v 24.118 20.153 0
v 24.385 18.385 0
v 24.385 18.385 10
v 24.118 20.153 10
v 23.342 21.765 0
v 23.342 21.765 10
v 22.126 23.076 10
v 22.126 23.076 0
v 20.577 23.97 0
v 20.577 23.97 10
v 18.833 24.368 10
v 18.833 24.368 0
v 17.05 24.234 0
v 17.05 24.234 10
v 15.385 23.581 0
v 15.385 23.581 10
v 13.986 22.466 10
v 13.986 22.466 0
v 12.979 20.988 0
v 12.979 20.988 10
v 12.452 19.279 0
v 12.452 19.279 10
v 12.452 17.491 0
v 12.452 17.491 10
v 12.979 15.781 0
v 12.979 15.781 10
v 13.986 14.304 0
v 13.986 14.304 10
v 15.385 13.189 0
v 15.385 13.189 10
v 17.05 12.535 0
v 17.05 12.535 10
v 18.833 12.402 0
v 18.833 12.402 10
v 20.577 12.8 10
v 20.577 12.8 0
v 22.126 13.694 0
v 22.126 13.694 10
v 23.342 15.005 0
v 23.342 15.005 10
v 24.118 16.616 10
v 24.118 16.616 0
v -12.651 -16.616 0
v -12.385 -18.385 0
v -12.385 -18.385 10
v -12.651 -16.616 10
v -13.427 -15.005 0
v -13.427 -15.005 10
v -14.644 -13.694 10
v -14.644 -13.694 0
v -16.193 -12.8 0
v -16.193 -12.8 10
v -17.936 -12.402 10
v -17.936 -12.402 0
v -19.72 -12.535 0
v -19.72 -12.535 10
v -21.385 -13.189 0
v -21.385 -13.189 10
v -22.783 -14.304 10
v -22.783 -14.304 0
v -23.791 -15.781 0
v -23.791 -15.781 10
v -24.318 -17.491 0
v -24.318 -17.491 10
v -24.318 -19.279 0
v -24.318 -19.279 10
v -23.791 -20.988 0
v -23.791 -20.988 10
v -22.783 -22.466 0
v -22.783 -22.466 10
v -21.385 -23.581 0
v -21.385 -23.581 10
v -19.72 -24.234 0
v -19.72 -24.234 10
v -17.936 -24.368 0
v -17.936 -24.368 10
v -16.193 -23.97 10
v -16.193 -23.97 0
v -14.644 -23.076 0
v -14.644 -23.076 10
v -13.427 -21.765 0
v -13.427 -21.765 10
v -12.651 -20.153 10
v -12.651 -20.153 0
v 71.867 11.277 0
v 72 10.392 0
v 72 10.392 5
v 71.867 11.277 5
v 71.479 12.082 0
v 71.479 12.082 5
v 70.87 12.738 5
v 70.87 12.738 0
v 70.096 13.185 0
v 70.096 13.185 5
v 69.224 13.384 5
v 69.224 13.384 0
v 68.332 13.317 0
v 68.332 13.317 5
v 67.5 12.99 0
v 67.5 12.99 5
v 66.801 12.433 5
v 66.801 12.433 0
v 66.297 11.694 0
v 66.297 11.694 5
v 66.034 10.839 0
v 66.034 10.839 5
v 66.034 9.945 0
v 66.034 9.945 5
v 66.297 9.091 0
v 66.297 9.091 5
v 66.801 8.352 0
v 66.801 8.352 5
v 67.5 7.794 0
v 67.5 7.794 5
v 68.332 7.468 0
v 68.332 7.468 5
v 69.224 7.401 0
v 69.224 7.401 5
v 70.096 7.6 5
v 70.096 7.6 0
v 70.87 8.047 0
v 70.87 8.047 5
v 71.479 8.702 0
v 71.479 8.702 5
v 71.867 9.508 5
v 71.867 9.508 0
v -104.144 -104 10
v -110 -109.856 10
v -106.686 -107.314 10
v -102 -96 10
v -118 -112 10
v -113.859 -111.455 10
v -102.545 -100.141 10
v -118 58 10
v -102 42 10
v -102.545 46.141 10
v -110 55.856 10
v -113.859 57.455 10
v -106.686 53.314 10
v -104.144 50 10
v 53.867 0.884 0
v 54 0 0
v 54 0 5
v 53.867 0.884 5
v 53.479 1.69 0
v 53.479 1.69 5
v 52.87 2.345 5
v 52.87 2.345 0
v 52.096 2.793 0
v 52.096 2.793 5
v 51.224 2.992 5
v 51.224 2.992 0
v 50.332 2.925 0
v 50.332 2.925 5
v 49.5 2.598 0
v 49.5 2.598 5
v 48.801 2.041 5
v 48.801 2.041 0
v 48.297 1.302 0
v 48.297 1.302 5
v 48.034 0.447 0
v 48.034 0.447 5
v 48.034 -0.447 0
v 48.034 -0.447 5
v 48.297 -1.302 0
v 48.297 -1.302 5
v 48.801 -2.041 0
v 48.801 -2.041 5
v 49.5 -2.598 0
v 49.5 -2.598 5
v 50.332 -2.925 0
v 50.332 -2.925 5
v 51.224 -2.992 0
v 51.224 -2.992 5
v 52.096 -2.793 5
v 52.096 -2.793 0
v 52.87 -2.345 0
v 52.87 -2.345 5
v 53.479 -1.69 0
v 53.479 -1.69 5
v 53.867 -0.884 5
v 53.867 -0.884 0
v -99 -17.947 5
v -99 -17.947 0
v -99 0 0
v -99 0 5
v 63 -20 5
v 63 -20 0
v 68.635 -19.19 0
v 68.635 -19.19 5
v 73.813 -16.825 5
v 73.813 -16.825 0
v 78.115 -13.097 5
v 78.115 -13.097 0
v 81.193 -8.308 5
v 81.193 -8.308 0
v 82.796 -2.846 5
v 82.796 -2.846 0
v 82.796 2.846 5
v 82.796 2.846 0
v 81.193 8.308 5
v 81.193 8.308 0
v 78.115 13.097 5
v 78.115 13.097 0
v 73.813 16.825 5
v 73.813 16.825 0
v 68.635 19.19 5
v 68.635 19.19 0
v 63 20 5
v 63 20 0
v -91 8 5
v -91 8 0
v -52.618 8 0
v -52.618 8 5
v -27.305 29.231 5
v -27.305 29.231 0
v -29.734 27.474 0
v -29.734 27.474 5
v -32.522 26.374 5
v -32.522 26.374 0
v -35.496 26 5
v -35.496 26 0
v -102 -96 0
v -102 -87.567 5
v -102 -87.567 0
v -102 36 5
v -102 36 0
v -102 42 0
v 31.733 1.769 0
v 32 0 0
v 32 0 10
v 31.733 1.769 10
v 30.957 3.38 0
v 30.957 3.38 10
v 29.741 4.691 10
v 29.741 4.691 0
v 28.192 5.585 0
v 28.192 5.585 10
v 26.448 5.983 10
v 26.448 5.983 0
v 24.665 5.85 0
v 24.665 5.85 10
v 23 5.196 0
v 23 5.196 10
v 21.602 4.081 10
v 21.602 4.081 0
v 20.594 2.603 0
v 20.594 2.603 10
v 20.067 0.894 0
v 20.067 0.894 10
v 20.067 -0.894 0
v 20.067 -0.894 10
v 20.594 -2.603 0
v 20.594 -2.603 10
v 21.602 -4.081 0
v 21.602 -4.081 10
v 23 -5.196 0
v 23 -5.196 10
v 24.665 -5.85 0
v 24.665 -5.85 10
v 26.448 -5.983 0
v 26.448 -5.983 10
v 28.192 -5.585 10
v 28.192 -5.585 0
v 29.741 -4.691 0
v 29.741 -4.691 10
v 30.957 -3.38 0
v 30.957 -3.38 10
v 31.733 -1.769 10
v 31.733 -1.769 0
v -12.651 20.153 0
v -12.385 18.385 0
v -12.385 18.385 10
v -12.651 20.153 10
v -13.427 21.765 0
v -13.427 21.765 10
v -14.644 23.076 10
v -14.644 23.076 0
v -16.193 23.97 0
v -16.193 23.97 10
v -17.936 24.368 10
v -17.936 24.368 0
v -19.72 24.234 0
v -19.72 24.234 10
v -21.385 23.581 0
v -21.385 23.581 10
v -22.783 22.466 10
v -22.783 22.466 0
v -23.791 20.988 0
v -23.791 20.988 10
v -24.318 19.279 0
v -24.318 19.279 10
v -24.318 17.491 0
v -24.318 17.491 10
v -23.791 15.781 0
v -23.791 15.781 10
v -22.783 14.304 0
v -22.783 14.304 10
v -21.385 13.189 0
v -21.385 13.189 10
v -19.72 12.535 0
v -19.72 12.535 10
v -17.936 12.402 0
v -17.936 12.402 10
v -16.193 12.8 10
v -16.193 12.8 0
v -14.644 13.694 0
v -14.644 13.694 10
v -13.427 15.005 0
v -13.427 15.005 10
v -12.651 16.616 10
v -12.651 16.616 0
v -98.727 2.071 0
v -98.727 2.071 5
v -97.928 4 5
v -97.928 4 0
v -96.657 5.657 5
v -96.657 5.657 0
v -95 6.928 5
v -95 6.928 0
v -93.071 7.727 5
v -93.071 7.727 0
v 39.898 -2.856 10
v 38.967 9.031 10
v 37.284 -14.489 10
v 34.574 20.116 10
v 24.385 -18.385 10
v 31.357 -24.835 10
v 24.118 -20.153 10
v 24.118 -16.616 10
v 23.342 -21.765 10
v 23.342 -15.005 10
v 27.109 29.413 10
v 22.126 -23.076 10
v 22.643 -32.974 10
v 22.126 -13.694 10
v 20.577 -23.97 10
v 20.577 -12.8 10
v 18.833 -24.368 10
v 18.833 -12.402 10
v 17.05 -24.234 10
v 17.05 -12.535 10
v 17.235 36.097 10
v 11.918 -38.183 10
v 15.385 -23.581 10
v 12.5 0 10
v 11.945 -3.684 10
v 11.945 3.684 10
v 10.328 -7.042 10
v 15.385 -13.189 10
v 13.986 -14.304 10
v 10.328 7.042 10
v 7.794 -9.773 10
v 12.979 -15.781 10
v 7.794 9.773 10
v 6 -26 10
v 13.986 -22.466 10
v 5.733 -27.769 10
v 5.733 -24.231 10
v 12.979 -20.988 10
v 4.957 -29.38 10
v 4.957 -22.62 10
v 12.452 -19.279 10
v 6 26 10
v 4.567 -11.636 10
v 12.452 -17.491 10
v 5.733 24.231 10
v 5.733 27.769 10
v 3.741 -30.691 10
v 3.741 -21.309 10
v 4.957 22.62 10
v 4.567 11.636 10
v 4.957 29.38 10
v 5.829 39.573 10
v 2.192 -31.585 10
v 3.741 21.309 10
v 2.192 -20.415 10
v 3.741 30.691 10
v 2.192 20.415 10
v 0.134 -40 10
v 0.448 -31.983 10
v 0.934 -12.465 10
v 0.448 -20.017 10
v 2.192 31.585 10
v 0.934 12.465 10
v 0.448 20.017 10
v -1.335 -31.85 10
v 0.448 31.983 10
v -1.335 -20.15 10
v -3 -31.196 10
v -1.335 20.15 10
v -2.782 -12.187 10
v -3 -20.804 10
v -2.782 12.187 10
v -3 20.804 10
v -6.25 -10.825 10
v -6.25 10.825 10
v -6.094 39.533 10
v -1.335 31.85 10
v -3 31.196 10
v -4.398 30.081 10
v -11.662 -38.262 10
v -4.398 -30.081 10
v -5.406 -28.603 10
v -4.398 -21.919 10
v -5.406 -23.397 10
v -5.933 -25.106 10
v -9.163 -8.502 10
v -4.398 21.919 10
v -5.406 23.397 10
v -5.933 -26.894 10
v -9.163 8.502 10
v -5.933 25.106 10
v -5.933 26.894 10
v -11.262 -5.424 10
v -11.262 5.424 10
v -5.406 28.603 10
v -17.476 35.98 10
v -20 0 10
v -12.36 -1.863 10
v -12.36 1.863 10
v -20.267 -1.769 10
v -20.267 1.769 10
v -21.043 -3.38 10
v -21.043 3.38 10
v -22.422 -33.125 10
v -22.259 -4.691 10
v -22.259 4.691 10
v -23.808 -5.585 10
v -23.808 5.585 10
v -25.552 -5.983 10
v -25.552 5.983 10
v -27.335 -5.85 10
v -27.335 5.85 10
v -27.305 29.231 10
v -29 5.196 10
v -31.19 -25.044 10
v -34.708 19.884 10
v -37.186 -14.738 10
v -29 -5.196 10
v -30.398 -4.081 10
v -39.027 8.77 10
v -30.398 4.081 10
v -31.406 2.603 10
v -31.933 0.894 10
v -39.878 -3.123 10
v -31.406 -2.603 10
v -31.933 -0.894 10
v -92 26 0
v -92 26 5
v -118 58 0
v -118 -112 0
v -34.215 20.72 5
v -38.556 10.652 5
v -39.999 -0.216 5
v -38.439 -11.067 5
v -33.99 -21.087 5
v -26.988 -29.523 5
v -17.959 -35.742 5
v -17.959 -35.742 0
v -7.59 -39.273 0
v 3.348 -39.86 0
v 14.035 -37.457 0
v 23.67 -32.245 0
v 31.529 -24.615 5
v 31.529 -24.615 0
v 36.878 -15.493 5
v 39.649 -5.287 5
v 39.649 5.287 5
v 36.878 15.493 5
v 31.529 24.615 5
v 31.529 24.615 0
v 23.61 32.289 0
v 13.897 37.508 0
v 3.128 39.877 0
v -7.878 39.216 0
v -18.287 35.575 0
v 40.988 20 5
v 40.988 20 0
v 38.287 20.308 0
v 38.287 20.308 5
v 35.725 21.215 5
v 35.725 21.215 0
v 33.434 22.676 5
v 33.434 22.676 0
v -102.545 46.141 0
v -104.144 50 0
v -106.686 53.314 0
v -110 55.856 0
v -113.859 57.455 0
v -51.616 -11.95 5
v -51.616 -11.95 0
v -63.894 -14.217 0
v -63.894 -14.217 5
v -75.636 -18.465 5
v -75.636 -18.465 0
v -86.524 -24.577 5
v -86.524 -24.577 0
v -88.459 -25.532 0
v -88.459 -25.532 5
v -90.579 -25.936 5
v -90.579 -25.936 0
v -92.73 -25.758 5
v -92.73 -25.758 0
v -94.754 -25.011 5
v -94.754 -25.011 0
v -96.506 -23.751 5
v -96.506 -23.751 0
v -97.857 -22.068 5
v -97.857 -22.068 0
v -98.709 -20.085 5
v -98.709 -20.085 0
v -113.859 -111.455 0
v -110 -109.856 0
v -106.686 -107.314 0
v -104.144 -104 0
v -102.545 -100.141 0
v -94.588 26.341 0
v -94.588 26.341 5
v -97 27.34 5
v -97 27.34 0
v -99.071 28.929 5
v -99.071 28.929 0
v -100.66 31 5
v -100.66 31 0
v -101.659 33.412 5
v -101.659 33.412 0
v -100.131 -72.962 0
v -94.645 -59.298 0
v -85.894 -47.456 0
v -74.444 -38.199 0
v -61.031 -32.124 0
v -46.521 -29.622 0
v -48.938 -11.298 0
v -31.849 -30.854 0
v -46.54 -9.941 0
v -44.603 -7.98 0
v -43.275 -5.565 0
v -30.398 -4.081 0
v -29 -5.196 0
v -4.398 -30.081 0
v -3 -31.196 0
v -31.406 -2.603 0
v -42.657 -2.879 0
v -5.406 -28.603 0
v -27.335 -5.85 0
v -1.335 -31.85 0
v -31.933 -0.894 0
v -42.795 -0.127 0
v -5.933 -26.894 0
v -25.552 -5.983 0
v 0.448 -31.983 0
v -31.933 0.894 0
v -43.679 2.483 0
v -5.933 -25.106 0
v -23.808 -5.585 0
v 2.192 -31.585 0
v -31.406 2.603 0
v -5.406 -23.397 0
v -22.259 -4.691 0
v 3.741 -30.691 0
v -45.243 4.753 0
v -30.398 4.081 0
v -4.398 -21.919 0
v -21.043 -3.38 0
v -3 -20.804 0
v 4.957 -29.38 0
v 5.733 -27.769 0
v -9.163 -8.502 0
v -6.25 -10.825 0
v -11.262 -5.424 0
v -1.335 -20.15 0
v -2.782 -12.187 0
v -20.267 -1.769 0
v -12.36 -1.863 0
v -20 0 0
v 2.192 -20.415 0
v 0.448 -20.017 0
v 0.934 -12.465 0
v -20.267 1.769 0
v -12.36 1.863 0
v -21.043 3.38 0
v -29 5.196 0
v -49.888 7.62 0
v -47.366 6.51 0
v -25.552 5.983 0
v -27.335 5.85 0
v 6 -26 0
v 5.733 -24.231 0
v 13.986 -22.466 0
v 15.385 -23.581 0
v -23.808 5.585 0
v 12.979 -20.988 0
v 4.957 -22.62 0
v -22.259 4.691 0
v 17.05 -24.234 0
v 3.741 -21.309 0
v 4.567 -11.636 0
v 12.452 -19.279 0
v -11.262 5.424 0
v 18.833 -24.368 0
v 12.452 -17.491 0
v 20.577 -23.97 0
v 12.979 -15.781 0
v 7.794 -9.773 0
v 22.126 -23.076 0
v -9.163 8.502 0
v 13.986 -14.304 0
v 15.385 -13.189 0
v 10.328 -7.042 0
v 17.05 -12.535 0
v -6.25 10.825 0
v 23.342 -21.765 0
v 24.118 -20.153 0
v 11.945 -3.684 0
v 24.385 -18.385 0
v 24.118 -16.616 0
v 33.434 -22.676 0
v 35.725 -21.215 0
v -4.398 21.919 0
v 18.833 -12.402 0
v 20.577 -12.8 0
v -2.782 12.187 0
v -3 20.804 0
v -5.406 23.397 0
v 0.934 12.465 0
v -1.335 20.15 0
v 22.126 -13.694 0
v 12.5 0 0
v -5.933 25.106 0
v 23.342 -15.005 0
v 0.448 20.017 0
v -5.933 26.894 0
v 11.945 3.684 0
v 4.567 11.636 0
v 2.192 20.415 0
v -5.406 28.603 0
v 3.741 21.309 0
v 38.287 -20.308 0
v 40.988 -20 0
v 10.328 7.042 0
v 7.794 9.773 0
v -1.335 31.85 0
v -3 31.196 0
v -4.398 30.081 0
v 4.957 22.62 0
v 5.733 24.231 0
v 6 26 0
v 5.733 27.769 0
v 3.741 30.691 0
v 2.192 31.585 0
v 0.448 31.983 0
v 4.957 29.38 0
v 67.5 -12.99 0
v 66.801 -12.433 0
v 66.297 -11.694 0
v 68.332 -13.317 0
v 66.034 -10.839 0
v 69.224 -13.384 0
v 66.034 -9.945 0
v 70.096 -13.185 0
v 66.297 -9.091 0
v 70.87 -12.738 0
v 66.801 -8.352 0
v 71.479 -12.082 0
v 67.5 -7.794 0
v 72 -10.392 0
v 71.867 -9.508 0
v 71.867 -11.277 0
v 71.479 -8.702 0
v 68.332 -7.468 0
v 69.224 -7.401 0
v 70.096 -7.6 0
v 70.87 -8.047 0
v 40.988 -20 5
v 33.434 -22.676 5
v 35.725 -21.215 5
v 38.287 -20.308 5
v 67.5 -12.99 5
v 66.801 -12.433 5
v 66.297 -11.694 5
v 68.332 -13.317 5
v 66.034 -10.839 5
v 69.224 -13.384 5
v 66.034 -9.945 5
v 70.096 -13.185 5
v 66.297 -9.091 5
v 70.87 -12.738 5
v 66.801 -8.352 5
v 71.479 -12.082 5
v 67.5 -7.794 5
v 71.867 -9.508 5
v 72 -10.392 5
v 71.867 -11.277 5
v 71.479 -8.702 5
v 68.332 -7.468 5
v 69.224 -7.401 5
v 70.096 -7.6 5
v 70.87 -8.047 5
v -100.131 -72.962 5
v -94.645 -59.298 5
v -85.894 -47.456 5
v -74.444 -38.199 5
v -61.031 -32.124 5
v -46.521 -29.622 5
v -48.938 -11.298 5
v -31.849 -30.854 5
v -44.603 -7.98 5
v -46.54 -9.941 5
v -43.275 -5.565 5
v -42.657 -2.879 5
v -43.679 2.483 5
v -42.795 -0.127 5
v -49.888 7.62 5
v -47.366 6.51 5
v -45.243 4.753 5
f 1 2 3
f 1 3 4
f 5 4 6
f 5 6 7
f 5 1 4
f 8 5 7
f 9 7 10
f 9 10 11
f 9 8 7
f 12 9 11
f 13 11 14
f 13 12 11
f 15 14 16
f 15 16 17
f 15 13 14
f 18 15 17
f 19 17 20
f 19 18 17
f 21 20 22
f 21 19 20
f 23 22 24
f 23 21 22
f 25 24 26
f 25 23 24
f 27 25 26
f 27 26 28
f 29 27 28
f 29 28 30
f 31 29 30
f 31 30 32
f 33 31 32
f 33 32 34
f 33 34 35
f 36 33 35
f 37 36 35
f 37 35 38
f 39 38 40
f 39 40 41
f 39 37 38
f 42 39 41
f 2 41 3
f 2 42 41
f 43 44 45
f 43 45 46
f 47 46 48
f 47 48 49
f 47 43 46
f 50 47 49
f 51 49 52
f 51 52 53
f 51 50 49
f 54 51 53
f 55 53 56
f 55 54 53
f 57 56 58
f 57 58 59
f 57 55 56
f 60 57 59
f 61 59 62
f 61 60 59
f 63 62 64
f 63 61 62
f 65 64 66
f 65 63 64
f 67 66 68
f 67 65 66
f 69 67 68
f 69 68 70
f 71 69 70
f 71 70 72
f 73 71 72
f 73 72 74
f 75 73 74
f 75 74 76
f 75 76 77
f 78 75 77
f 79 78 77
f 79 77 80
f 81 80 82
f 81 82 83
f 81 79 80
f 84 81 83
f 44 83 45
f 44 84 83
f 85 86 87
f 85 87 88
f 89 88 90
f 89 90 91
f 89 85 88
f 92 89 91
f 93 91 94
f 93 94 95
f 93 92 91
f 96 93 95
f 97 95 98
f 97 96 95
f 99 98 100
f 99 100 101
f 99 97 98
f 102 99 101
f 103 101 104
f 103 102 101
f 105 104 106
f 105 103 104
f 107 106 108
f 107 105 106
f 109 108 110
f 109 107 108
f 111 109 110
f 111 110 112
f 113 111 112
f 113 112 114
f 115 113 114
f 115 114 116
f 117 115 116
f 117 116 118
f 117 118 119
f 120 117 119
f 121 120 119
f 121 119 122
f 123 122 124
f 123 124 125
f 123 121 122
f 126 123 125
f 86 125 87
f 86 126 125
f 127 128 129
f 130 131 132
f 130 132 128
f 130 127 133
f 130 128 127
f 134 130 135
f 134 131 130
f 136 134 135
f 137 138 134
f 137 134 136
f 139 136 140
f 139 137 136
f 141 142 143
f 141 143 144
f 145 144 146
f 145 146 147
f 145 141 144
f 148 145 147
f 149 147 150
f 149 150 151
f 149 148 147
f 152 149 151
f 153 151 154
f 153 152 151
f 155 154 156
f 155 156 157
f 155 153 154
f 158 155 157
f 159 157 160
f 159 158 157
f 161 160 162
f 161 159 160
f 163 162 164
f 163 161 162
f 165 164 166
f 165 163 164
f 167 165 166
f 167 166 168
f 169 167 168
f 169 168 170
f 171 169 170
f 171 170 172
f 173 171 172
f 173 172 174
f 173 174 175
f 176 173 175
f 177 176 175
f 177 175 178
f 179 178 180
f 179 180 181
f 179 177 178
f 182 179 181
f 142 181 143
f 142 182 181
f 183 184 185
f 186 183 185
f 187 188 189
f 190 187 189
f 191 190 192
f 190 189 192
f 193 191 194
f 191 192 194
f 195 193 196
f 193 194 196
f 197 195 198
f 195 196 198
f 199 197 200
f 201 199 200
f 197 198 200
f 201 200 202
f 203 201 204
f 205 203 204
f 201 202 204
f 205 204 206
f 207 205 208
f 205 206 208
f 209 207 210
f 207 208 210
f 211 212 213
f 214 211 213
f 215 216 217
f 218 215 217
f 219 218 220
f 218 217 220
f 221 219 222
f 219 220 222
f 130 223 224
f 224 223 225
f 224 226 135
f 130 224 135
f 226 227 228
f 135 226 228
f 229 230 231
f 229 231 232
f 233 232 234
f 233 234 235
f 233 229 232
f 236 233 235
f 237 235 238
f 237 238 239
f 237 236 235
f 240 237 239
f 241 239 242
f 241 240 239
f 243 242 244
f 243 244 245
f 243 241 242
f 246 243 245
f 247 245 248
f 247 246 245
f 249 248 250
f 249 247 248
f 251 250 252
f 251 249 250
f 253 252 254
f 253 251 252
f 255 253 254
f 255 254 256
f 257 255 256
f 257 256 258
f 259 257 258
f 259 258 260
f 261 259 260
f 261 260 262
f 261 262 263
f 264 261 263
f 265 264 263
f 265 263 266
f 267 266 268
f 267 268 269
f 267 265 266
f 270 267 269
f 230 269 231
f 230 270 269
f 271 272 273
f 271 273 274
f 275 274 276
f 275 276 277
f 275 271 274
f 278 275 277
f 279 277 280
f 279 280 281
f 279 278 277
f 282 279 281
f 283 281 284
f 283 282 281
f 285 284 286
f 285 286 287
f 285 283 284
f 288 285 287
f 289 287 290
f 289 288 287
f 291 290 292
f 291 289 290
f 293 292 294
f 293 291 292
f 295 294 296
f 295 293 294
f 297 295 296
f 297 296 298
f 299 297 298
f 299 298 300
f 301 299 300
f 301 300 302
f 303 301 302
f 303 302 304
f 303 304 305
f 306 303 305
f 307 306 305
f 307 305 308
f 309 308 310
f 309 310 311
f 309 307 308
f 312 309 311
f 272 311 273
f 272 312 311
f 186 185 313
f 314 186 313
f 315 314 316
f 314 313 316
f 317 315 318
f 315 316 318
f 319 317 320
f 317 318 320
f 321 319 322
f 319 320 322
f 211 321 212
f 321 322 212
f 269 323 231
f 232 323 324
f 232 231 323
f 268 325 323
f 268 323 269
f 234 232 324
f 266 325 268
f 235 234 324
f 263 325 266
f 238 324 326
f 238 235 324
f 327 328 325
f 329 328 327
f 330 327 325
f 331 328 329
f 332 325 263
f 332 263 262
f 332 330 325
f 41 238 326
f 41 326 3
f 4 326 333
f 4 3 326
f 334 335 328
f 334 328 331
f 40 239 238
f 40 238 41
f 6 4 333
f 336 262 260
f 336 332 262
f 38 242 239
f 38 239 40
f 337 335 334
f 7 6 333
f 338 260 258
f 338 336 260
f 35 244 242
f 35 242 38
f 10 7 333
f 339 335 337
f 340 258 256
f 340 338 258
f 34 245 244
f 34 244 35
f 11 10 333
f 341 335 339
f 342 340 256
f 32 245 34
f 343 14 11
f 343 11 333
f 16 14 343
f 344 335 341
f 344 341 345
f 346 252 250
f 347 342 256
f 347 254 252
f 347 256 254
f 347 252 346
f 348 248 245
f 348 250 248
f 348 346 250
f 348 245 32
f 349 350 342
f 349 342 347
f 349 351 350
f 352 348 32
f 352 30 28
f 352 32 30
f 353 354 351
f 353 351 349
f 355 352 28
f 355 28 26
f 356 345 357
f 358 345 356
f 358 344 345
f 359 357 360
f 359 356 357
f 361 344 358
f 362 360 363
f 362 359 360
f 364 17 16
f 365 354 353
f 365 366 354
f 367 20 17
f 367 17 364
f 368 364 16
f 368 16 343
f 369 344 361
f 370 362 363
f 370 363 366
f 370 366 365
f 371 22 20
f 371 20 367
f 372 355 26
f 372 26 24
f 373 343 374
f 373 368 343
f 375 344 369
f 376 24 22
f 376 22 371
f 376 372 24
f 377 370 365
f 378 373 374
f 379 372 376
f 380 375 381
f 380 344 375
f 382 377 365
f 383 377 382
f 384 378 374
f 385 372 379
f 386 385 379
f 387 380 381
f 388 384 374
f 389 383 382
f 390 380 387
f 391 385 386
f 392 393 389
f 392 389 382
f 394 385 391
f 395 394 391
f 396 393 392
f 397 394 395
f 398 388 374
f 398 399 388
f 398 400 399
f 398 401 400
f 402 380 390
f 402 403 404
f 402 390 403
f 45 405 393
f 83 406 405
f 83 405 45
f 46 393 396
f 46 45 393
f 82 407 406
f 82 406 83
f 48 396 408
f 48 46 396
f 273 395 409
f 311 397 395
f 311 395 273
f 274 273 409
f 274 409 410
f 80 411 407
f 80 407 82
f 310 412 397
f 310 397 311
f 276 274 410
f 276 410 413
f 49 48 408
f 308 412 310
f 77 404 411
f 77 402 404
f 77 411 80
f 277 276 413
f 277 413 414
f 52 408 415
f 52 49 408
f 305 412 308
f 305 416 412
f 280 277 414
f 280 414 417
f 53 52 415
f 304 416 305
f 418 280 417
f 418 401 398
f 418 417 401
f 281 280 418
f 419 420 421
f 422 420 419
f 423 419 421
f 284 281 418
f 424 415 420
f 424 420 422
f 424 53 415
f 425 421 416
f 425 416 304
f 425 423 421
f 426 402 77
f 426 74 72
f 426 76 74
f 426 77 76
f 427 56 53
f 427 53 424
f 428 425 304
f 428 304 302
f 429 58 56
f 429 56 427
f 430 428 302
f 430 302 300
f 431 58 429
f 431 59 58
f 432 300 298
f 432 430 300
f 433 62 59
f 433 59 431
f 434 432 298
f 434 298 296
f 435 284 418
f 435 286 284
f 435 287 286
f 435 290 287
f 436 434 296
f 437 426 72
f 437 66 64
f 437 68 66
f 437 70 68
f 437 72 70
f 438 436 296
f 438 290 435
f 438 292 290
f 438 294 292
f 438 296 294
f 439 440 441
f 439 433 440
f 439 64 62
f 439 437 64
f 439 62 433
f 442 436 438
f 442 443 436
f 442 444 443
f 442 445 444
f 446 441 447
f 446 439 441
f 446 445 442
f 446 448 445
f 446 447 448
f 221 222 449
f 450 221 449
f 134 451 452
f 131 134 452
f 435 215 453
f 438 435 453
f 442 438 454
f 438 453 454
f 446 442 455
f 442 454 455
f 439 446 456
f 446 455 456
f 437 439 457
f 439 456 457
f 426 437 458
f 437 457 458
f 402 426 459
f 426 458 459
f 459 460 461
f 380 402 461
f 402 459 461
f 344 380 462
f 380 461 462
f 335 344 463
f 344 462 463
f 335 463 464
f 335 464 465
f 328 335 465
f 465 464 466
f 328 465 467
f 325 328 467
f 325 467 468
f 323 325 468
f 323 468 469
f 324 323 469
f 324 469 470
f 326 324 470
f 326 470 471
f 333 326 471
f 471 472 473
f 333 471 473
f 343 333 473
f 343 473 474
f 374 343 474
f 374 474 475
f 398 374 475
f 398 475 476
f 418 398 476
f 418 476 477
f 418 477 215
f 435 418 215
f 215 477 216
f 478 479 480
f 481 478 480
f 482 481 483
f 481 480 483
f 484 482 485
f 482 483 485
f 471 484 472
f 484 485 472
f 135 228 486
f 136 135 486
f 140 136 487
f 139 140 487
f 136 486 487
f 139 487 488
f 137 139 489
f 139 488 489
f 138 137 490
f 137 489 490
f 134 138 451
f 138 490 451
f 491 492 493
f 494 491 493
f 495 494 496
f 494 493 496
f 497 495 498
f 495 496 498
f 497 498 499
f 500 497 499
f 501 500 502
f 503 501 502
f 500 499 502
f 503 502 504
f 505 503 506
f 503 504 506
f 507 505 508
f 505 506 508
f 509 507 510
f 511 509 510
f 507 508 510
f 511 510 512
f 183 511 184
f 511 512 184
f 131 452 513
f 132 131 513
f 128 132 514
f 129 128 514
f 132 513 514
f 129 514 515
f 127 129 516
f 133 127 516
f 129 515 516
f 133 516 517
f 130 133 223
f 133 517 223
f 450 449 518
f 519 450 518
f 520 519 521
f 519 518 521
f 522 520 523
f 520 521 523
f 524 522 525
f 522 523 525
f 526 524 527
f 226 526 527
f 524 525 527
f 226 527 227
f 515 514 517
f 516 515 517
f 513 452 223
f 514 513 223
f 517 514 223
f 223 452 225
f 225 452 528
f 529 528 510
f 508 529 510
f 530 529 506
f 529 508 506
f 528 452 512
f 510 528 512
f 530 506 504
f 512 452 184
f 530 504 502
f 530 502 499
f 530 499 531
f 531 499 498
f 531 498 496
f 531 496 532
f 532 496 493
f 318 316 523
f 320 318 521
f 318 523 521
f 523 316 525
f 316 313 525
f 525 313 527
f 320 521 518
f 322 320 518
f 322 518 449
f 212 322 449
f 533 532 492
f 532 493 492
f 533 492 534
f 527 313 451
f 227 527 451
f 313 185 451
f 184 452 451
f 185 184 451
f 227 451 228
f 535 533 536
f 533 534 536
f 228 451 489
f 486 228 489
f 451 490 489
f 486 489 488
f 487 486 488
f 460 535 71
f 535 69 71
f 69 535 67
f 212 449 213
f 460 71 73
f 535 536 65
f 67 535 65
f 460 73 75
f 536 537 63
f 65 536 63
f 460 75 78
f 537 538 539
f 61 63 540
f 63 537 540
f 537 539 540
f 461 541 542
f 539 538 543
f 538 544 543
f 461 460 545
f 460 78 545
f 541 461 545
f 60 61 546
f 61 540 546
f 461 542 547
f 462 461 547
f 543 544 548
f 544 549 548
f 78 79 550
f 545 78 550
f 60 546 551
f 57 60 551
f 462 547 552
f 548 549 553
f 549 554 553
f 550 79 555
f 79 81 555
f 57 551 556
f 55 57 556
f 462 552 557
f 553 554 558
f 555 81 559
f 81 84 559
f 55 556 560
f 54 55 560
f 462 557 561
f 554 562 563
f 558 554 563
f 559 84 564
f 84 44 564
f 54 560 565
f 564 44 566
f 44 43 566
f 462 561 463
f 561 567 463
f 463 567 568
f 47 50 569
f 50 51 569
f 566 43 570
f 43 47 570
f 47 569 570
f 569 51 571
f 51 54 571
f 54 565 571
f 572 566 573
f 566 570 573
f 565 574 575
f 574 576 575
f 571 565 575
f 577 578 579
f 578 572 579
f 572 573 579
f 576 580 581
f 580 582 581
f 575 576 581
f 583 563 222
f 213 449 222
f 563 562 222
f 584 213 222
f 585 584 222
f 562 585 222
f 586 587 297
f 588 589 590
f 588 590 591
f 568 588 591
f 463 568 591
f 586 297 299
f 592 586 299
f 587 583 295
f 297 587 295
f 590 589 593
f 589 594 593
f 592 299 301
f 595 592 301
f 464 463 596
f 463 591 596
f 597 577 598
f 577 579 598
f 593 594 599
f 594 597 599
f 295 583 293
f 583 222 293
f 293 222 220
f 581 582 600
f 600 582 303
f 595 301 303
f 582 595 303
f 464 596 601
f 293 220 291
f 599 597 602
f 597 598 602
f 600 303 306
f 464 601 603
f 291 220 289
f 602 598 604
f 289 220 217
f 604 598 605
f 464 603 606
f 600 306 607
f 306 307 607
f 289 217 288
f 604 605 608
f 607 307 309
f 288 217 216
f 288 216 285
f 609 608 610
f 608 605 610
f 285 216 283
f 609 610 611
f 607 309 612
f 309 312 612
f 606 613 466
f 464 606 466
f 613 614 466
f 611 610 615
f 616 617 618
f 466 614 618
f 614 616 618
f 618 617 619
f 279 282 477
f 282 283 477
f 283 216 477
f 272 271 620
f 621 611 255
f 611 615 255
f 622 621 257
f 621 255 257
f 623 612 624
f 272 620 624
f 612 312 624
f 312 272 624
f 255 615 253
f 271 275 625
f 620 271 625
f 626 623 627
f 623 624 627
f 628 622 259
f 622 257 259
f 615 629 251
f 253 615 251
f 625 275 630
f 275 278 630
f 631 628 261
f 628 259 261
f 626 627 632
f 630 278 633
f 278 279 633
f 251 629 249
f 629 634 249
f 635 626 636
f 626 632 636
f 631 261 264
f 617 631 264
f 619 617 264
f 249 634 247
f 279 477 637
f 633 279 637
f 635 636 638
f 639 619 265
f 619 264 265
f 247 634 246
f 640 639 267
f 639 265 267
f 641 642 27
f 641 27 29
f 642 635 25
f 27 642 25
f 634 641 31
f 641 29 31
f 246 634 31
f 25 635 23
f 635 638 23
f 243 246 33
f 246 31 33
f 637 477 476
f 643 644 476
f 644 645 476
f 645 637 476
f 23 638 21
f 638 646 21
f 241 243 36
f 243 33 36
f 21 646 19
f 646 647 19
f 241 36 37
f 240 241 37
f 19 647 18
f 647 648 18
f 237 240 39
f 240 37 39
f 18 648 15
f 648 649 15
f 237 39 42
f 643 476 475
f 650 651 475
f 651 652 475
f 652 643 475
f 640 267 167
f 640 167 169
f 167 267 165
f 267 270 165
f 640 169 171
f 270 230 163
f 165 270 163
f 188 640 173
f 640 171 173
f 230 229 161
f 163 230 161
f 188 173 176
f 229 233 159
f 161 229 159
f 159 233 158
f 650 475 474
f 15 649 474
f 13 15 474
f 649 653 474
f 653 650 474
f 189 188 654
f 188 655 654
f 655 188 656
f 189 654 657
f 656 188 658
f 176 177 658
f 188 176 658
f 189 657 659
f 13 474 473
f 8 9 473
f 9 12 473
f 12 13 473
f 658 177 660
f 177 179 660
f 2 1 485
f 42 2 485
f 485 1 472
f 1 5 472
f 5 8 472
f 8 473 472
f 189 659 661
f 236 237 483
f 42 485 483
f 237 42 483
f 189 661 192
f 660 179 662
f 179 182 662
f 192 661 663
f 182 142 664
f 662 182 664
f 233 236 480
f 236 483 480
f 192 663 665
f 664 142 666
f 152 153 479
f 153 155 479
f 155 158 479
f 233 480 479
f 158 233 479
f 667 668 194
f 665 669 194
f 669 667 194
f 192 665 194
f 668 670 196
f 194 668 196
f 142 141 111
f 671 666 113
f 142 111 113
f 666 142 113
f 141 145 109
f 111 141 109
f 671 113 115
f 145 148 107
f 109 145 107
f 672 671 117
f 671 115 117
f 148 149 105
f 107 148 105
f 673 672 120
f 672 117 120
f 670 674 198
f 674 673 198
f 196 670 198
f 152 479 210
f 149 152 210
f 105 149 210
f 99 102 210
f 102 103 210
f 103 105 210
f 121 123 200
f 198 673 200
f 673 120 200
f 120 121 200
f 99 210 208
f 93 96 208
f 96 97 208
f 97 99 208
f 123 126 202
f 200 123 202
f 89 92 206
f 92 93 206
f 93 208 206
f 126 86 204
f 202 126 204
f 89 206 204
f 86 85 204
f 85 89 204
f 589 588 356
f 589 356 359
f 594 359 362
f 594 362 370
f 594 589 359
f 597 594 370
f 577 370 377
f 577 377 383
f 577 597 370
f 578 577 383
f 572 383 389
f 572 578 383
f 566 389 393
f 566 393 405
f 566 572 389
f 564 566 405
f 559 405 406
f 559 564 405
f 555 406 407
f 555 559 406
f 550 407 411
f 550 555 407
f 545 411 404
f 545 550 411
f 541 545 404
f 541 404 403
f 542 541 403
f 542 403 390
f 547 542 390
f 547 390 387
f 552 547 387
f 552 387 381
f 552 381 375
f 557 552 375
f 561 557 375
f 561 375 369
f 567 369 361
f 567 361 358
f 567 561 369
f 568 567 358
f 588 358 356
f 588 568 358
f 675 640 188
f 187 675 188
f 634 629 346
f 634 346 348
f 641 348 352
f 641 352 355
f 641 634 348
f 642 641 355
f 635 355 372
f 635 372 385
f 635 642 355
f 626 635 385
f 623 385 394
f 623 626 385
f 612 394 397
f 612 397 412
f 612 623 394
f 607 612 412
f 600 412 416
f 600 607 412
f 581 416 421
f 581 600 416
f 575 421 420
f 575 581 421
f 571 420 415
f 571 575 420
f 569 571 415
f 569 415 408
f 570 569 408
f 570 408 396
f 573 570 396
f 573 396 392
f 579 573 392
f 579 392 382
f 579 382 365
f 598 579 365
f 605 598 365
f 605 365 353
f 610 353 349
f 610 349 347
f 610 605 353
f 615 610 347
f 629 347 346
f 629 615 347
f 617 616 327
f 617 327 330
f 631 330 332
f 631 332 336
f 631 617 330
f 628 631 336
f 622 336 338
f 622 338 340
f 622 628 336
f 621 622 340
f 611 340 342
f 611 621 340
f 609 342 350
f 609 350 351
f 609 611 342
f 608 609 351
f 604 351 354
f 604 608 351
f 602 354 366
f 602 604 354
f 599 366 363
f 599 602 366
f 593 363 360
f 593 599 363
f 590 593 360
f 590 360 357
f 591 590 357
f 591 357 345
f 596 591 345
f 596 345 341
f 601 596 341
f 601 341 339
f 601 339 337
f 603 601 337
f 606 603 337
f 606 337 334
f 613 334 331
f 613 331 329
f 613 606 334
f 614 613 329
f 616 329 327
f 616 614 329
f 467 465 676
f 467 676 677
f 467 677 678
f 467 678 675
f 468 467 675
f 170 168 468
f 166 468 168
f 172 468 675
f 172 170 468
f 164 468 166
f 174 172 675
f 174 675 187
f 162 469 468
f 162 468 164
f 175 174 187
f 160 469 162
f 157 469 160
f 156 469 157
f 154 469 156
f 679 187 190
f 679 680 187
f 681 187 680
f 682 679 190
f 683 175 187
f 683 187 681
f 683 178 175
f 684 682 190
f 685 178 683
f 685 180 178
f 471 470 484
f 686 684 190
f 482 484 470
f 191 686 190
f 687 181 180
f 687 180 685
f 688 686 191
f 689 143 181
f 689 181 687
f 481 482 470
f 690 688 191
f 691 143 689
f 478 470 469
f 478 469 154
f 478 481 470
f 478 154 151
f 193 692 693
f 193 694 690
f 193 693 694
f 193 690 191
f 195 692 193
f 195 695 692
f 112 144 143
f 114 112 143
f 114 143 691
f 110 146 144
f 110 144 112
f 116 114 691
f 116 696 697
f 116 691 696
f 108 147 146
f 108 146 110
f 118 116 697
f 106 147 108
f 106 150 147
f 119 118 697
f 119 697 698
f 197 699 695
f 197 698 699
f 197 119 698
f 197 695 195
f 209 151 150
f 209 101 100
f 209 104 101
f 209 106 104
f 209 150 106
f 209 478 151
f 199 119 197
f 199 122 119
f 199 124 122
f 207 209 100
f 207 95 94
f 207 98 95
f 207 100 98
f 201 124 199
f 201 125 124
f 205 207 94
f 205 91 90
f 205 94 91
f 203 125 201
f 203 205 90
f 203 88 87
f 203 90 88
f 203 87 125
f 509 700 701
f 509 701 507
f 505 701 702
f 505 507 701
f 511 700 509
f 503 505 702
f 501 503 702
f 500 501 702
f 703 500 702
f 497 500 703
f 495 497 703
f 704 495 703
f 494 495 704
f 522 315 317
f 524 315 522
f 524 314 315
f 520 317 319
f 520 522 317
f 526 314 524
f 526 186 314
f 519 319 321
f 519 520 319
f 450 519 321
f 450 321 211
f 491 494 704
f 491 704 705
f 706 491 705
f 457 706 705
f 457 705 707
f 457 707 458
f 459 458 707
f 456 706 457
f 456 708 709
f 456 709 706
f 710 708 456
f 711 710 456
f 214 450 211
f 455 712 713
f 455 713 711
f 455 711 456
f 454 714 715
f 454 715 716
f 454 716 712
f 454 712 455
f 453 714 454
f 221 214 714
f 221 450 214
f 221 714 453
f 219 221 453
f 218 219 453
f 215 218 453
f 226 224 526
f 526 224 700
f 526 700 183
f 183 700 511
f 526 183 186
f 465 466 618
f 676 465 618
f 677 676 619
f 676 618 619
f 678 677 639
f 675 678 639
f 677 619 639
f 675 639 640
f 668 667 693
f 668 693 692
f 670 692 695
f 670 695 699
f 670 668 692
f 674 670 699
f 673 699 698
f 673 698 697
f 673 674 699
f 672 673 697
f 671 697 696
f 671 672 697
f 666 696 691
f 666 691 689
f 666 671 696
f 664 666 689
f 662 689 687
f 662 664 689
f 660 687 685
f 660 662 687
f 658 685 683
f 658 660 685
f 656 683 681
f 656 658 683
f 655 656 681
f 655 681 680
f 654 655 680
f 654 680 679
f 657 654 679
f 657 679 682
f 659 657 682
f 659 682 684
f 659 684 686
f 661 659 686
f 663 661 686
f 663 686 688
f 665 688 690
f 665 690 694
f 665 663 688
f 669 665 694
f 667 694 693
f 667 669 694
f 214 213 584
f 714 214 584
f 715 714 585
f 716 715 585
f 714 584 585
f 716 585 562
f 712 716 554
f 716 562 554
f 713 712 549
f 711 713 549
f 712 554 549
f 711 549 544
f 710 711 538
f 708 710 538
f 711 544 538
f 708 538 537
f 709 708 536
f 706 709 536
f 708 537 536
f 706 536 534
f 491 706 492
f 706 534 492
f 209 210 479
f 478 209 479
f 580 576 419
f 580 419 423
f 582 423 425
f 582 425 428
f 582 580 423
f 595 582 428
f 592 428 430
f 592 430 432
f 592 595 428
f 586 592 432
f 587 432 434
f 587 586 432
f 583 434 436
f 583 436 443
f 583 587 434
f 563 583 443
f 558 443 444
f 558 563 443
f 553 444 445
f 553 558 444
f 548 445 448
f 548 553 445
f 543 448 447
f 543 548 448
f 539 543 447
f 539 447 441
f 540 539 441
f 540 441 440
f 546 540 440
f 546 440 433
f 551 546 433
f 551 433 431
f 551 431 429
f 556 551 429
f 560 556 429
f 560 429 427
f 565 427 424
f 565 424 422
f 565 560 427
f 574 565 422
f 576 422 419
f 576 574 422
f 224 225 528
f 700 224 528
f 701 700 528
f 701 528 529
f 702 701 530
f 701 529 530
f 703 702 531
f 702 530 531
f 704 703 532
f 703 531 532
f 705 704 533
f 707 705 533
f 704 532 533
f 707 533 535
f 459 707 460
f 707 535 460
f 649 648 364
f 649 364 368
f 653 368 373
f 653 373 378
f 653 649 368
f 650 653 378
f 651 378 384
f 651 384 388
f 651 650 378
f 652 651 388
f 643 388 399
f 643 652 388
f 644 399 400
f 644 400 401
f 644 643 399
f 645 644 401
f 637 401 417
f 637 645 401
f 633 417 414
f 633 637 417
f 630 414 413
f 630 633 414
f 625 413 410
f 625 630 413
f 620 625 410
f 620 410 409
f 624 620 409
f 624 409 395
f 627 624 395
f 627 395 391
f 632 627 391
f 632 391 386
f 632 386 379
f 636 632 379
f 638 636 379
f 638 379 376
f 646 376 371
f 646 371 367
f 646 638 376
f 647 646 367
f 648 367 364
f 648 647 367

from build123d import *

# Parameters (mm, degrees)
SKETCH_2_R        = 3
EXTRUDE_1_DEPTH   = 5
EXTRUDE_1_2_DEPTH = 5
SKETCH_2_3_R      = 40
SKETCH_2_3_R_2    = 6
SKETCH_2_3_R_3    = 12.5
EXTRUDE_2_DEPTH   = 10


with BuildPart() as part:
    # Эскиз2 → Бобышка-Вытянуть1 (new body)
    with BuildSketch(Plane.XY):
        with BuildLine():
            ThreePointArc((63, -20), (83, 0), (63, 20))
            Line((63, 20), (40.987803064, 20))
            ThreePointArc((40.987803064, 20), (35.725454948, 21.215395589), (31.52907928, 24.615384615))
            ThreePointArc((31.52907928, 24.615384615), (40, 0), (31.52907928, -24.615384615))
            ThreePointArc((31.52907928, -24.615384615), (35.725454948, -21.215395589), (40.987803064, -20))
            Line((40.987803064, -20), (63, -20))
        make_face()
        with Locations((69, -10.392304845)):
            Circle(SKETCH_2_R, mode=Mode.SUBTRACT)
        with Locations((51, 0)):
            Circle(SKETCH_2_R, mode=Mode.SUBTRACT)
        with Locations((69, 10.392304845)):
            Circle(SKETCH_2_R, mode=Mode.SUBTRACT)
    extrude(amount=EXTRUDE_1_DEPTH)



with BuildPart() as body_2:
    # Эскиз2 → Extrude 1 2 (new body)
    with BuildSketch(Plane.XY):
        with BuildLine():
            ThreePointArc((-17.959183673, -35.741680455), (-39.592499474, -5.695084317), (-27.304983614, 29.230769231))
            ThreePointArc((-27.304983614, 29.230769231), (-31.093682384, 26.836873887), (-35.496478699, 26))
            Line((-35.496478699, 26), (-92, 26))
            ThreePointArc((-92, 26), (-99.071067812, 28.928932188), (-102, 36))
            Line((-102, 36), (-102, -87.567117116))
            ThreePointArc((-102, -87.567117116), (-74.443658232, -38.199276638), (-17.959183673, -35.741680455))
        make_face()
        with BuildLine():
            ThreePointArc((-99, 0), (-96.656854249, 5.656854249), (-91, 8))
            Line((-91, 8), (-52.617915552, 8))
            ThreePointArc((-52.617915552, 8), (-42.630507284, -1.498326705), (-51.615832348, -11.949664781))
            ThreePointArc((-51.615832348, -11.949664781), (-69.852655287, -16.099360648), (-86.523809524, -24.577232027))
            ThreePointArc((-86.523809524, -24.577232027), (-94.754362542, -25.011048058), (-99, -17.946717807))
            Line((-99, -17.946717807), (-99, 0))
        make_face(mode=Mode.SUBTRACT)
    extrude(amount=EXTRUDE_1_2_DEPTH)


with BuildPart() as part_1:
    add(part.part)

    add(body_2.part)  # Бобышка-Вытянуть2 merges body 2
    # Эскиз2<3> → Бобышка-Вытянуть2 (add)
    # profile 1 of 2: a face of its own
    with BuildSketch(Plane.XY):
        Circle(SKETCH_2_3_R)
        with Locations((-18.384776311, -18.384776311)):
            Circle(SKETCH_2_3_R_2, mode=Mode.SUBTRACT)
        with Locations((-26, 0)):
            Circle(SKETCH_2_3_R_2, mode=Mode.SUBTRACT)
        with Locations((-18.384776311, 18.384776311)):
            Circle(SKETCH_2_3_R_2, mode=Mode.SUBTRACT)
        with Locations((0, -26)):
            Circle(SKETCH_2_3_R_2, mode=Mode.SUBTRACT)
        with Locations((18.384776311, -18.384776311)):
            Circle(SKETCH_2_3_R_2, mode=Mode.SUBTRACT)
        Circle(SKETCH_2_3_R_3, mode=Mode.SUBTRACT)
        with Locations((26, 0)):
            Circle(SKETCH_2_3_R_2, mode=Mode.SUBTRACT)
        with Locations((0, 26)):
            Circle(SKETCH_2_3_R_2, mode=Mode.SUBTRACT)
        with Locations((18.384776311, 18.384776311)):
            Circle(SKETCH_2_3_R_2, mode=Mode.SUBTRACT)
    # profile 2 of 2: a face of its own
    with BuildSketch(Plane.XY):
        with BuildLine():
            Line((-102, -96), (-102, 42))
            ThreePointArc((-102, 42), (-106.686291501, 53.313708499), (-118, 58))
            Line((-118, 58), (-118, -112))
            ThreePointArc((-118, -112), (-106.686291501, -107.313708499), (-102, -96))
        make_face()
    extrude(amount=EXTRUDE_2_DEPTH)


solid = part_1.part
